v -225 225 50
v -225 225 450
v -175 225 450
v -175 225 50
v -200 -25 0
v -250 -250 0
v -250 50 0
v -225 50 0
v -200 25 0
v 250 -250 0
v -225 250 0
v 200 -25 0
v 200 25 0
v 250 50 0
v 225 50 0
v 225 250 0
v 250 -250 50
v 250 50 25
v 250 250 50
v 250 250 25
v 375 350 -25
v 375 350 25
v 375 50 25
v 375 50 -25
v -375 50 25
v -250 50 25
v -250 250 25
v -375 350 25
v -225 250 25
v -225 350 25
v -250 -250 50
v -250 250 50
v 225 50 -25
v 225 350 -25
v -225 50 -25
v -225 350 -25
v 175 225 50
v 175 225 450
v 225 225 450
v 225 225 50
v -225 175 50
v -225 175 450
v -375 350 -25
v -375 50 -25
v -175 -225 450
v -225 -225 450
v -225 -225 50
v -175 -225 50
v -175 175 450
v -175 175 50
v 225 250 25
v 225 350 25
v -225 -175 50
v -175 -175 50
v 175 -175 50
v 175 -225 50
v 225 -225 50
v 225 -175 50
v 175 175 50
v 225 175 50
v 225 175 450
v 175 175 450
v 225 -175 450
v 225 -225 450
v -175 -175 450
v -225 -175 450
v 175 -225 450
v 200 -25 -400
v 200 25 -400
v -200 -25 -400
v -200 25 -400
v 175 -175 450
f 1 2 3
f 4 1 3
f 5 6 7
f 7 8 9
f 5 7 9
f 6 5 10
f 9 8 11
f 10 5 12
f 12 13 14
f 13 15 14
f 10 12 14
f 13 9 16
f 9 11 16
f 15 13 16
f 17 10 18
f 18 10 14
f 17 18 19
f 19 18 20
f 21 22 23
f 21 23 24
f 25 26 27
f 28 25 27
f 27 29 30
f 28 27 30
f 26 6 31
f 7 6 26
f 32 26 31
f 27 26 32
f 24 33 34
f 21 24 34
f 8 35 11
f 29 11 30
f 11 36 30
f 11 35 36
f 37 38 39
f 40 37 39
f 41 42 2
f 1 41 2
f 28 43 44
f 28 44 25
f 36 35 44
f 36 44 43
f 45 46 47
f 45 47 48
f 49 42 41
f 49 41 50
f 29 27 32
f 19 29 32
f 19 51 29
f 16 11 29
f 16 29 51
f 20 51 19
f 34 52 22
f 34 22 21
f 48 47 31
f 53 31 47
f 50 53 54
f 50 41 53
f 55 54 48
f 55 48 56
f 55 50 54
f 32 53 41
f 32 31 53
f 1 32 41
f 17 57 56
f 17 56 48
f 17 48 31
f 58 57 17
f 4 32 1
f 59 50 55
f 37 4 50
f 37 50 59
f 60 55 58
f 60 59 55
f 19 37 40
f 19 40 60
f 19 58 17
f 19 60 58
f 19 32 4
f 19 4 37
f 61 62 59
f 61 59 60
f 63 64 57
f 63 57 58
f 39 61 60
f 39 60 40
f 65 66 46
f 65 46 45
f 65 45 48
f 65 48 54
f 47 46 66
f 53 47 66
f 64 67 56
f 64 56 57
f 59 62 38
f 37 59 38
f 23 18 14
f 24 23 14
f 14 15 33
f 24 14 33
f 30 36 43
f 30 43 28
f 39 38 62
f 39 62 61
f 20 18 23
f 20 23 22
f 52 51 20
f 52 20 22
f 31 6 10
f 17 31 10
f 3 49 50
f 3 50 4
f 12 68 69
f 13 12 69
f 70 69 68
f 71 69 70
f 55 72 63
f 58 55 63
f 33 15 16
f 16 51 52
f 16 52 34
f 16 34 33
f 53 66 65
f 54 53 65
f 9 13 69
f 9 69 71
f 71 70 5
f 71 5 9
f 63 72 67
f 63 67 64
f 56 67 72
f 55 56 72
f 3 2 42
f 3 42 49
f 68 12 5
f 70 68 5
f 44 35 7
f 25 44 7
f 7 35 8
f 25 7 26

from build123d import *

# Parameters (mm, degrees)
SKETCH_1_W      = 500
SKETCH_1_H      = 500
EXTRUDE_1_DEPTH = 50
SKETCH_2_W      = 50
SKETCH_2_H      = 50
EXTRUDE_2_DEPTH = 450
SKETCH_3_W      = 50
SKETCH_3_H      = 50
EXTRUDE_3_DEPTH = 450
SKETCH_4_W      = 50
SKETCH_4_H      = 50
EXTRUDE_4_DEPTH = 450
SKETCH_5_W      = 50
SKETCH_5_H      = 50
EXTRUDE_5_DEPTH = 450
SKETCH_6_W      = 400
SKETCH_6_H      = 50
EXTRUDE_6_DEPTH = 400
SKETCH_7_W      = 50
SKETCH_7_H      = 300
EXTRUDE_7_DEPTH = 150
SKETCH_8_W      = 50
SKETCH_8_H      = 300
EXTRUDE_8_DEPTH = 150


with BuildPart() as part:
    # 草图1 → 凸台-拉伸1 (new body)
    with BuildSketch(Plane.XY):
        Rectangle(SKETCH_1_W, SKETCH_1_H)
    extrude(amount=EXTRUDE_1_DEPTH)

    # 草图2 → 凸台-拉伸2 (add)
    with BuildSketch(Plane.XY):
        with Locations((-200, -200)):
            Rectangle(SKETCH_2_W, SKETCH_2_H)
    extrude(amount=EXTRUDE_2_DEPTH)

    # 草图3 → 凸台-拉伸3 (add)
    with BuildSketch(Plane.XY):
        with Locations((200, -200)):
            Rectangle(SKETCH_3_W, SKETCH_3_H)
    extrude(amount=EXTRUDE_3_DEPTH)

    # 草图4 → 凸台-拉伸4 (add)
    with BuildSketch(Plane.XY):
        with Locations((-200, 200)):
            Rectangle(SKETCH_4_W, SKETCH_4_H)
    extrude(amount=EXTRUDE_4_DEPTH)

    # 草图5 → 凸台-拉伸5 (add)
    with BuildSketch(Plane.XY):
        with Locations((200, 200)):
            Rectangle(SKETCH_5_W, SKETCH_5_H)
    extrude(amount=EXTRUDE_5_DEPTH)

    # 草图6 → 凸台-拉伸6 (add)
    with BuildSketch(Plane(origin=(0, 0, 0), x_dir=(-1, 0, 0), z_dir=(0, 0, -1))):
        Rectangle(SKETCH_6_W, SKETCH_6_H)
    extrude(amount=EXTRUDE_6_DEPTH)

    # 草图7 → 凸台-拉伸7 (add)
    with BuildSketch(Plane(origin=(225, 0, 0), x_dir=(0, 0, -1), z_dir=(1, 0, 0))):
        with Locations((0, 200)):
            Rectangle(SKETCH_7_W, SKETCH_7_H)
    extrude(amount=EXTRUDE_7_DEPTH)

    # 草图8 → 凸台-拉伸8 (add)
    with BuildSketch(Plane.ZY.offset(225)):
        with Locations((0, 200)):
            Rectangle(SKETCH_8_W, SKETCH_8_H)
    extrude(amount=EXTRUDE_8_DEPTH)


solid = part.part
